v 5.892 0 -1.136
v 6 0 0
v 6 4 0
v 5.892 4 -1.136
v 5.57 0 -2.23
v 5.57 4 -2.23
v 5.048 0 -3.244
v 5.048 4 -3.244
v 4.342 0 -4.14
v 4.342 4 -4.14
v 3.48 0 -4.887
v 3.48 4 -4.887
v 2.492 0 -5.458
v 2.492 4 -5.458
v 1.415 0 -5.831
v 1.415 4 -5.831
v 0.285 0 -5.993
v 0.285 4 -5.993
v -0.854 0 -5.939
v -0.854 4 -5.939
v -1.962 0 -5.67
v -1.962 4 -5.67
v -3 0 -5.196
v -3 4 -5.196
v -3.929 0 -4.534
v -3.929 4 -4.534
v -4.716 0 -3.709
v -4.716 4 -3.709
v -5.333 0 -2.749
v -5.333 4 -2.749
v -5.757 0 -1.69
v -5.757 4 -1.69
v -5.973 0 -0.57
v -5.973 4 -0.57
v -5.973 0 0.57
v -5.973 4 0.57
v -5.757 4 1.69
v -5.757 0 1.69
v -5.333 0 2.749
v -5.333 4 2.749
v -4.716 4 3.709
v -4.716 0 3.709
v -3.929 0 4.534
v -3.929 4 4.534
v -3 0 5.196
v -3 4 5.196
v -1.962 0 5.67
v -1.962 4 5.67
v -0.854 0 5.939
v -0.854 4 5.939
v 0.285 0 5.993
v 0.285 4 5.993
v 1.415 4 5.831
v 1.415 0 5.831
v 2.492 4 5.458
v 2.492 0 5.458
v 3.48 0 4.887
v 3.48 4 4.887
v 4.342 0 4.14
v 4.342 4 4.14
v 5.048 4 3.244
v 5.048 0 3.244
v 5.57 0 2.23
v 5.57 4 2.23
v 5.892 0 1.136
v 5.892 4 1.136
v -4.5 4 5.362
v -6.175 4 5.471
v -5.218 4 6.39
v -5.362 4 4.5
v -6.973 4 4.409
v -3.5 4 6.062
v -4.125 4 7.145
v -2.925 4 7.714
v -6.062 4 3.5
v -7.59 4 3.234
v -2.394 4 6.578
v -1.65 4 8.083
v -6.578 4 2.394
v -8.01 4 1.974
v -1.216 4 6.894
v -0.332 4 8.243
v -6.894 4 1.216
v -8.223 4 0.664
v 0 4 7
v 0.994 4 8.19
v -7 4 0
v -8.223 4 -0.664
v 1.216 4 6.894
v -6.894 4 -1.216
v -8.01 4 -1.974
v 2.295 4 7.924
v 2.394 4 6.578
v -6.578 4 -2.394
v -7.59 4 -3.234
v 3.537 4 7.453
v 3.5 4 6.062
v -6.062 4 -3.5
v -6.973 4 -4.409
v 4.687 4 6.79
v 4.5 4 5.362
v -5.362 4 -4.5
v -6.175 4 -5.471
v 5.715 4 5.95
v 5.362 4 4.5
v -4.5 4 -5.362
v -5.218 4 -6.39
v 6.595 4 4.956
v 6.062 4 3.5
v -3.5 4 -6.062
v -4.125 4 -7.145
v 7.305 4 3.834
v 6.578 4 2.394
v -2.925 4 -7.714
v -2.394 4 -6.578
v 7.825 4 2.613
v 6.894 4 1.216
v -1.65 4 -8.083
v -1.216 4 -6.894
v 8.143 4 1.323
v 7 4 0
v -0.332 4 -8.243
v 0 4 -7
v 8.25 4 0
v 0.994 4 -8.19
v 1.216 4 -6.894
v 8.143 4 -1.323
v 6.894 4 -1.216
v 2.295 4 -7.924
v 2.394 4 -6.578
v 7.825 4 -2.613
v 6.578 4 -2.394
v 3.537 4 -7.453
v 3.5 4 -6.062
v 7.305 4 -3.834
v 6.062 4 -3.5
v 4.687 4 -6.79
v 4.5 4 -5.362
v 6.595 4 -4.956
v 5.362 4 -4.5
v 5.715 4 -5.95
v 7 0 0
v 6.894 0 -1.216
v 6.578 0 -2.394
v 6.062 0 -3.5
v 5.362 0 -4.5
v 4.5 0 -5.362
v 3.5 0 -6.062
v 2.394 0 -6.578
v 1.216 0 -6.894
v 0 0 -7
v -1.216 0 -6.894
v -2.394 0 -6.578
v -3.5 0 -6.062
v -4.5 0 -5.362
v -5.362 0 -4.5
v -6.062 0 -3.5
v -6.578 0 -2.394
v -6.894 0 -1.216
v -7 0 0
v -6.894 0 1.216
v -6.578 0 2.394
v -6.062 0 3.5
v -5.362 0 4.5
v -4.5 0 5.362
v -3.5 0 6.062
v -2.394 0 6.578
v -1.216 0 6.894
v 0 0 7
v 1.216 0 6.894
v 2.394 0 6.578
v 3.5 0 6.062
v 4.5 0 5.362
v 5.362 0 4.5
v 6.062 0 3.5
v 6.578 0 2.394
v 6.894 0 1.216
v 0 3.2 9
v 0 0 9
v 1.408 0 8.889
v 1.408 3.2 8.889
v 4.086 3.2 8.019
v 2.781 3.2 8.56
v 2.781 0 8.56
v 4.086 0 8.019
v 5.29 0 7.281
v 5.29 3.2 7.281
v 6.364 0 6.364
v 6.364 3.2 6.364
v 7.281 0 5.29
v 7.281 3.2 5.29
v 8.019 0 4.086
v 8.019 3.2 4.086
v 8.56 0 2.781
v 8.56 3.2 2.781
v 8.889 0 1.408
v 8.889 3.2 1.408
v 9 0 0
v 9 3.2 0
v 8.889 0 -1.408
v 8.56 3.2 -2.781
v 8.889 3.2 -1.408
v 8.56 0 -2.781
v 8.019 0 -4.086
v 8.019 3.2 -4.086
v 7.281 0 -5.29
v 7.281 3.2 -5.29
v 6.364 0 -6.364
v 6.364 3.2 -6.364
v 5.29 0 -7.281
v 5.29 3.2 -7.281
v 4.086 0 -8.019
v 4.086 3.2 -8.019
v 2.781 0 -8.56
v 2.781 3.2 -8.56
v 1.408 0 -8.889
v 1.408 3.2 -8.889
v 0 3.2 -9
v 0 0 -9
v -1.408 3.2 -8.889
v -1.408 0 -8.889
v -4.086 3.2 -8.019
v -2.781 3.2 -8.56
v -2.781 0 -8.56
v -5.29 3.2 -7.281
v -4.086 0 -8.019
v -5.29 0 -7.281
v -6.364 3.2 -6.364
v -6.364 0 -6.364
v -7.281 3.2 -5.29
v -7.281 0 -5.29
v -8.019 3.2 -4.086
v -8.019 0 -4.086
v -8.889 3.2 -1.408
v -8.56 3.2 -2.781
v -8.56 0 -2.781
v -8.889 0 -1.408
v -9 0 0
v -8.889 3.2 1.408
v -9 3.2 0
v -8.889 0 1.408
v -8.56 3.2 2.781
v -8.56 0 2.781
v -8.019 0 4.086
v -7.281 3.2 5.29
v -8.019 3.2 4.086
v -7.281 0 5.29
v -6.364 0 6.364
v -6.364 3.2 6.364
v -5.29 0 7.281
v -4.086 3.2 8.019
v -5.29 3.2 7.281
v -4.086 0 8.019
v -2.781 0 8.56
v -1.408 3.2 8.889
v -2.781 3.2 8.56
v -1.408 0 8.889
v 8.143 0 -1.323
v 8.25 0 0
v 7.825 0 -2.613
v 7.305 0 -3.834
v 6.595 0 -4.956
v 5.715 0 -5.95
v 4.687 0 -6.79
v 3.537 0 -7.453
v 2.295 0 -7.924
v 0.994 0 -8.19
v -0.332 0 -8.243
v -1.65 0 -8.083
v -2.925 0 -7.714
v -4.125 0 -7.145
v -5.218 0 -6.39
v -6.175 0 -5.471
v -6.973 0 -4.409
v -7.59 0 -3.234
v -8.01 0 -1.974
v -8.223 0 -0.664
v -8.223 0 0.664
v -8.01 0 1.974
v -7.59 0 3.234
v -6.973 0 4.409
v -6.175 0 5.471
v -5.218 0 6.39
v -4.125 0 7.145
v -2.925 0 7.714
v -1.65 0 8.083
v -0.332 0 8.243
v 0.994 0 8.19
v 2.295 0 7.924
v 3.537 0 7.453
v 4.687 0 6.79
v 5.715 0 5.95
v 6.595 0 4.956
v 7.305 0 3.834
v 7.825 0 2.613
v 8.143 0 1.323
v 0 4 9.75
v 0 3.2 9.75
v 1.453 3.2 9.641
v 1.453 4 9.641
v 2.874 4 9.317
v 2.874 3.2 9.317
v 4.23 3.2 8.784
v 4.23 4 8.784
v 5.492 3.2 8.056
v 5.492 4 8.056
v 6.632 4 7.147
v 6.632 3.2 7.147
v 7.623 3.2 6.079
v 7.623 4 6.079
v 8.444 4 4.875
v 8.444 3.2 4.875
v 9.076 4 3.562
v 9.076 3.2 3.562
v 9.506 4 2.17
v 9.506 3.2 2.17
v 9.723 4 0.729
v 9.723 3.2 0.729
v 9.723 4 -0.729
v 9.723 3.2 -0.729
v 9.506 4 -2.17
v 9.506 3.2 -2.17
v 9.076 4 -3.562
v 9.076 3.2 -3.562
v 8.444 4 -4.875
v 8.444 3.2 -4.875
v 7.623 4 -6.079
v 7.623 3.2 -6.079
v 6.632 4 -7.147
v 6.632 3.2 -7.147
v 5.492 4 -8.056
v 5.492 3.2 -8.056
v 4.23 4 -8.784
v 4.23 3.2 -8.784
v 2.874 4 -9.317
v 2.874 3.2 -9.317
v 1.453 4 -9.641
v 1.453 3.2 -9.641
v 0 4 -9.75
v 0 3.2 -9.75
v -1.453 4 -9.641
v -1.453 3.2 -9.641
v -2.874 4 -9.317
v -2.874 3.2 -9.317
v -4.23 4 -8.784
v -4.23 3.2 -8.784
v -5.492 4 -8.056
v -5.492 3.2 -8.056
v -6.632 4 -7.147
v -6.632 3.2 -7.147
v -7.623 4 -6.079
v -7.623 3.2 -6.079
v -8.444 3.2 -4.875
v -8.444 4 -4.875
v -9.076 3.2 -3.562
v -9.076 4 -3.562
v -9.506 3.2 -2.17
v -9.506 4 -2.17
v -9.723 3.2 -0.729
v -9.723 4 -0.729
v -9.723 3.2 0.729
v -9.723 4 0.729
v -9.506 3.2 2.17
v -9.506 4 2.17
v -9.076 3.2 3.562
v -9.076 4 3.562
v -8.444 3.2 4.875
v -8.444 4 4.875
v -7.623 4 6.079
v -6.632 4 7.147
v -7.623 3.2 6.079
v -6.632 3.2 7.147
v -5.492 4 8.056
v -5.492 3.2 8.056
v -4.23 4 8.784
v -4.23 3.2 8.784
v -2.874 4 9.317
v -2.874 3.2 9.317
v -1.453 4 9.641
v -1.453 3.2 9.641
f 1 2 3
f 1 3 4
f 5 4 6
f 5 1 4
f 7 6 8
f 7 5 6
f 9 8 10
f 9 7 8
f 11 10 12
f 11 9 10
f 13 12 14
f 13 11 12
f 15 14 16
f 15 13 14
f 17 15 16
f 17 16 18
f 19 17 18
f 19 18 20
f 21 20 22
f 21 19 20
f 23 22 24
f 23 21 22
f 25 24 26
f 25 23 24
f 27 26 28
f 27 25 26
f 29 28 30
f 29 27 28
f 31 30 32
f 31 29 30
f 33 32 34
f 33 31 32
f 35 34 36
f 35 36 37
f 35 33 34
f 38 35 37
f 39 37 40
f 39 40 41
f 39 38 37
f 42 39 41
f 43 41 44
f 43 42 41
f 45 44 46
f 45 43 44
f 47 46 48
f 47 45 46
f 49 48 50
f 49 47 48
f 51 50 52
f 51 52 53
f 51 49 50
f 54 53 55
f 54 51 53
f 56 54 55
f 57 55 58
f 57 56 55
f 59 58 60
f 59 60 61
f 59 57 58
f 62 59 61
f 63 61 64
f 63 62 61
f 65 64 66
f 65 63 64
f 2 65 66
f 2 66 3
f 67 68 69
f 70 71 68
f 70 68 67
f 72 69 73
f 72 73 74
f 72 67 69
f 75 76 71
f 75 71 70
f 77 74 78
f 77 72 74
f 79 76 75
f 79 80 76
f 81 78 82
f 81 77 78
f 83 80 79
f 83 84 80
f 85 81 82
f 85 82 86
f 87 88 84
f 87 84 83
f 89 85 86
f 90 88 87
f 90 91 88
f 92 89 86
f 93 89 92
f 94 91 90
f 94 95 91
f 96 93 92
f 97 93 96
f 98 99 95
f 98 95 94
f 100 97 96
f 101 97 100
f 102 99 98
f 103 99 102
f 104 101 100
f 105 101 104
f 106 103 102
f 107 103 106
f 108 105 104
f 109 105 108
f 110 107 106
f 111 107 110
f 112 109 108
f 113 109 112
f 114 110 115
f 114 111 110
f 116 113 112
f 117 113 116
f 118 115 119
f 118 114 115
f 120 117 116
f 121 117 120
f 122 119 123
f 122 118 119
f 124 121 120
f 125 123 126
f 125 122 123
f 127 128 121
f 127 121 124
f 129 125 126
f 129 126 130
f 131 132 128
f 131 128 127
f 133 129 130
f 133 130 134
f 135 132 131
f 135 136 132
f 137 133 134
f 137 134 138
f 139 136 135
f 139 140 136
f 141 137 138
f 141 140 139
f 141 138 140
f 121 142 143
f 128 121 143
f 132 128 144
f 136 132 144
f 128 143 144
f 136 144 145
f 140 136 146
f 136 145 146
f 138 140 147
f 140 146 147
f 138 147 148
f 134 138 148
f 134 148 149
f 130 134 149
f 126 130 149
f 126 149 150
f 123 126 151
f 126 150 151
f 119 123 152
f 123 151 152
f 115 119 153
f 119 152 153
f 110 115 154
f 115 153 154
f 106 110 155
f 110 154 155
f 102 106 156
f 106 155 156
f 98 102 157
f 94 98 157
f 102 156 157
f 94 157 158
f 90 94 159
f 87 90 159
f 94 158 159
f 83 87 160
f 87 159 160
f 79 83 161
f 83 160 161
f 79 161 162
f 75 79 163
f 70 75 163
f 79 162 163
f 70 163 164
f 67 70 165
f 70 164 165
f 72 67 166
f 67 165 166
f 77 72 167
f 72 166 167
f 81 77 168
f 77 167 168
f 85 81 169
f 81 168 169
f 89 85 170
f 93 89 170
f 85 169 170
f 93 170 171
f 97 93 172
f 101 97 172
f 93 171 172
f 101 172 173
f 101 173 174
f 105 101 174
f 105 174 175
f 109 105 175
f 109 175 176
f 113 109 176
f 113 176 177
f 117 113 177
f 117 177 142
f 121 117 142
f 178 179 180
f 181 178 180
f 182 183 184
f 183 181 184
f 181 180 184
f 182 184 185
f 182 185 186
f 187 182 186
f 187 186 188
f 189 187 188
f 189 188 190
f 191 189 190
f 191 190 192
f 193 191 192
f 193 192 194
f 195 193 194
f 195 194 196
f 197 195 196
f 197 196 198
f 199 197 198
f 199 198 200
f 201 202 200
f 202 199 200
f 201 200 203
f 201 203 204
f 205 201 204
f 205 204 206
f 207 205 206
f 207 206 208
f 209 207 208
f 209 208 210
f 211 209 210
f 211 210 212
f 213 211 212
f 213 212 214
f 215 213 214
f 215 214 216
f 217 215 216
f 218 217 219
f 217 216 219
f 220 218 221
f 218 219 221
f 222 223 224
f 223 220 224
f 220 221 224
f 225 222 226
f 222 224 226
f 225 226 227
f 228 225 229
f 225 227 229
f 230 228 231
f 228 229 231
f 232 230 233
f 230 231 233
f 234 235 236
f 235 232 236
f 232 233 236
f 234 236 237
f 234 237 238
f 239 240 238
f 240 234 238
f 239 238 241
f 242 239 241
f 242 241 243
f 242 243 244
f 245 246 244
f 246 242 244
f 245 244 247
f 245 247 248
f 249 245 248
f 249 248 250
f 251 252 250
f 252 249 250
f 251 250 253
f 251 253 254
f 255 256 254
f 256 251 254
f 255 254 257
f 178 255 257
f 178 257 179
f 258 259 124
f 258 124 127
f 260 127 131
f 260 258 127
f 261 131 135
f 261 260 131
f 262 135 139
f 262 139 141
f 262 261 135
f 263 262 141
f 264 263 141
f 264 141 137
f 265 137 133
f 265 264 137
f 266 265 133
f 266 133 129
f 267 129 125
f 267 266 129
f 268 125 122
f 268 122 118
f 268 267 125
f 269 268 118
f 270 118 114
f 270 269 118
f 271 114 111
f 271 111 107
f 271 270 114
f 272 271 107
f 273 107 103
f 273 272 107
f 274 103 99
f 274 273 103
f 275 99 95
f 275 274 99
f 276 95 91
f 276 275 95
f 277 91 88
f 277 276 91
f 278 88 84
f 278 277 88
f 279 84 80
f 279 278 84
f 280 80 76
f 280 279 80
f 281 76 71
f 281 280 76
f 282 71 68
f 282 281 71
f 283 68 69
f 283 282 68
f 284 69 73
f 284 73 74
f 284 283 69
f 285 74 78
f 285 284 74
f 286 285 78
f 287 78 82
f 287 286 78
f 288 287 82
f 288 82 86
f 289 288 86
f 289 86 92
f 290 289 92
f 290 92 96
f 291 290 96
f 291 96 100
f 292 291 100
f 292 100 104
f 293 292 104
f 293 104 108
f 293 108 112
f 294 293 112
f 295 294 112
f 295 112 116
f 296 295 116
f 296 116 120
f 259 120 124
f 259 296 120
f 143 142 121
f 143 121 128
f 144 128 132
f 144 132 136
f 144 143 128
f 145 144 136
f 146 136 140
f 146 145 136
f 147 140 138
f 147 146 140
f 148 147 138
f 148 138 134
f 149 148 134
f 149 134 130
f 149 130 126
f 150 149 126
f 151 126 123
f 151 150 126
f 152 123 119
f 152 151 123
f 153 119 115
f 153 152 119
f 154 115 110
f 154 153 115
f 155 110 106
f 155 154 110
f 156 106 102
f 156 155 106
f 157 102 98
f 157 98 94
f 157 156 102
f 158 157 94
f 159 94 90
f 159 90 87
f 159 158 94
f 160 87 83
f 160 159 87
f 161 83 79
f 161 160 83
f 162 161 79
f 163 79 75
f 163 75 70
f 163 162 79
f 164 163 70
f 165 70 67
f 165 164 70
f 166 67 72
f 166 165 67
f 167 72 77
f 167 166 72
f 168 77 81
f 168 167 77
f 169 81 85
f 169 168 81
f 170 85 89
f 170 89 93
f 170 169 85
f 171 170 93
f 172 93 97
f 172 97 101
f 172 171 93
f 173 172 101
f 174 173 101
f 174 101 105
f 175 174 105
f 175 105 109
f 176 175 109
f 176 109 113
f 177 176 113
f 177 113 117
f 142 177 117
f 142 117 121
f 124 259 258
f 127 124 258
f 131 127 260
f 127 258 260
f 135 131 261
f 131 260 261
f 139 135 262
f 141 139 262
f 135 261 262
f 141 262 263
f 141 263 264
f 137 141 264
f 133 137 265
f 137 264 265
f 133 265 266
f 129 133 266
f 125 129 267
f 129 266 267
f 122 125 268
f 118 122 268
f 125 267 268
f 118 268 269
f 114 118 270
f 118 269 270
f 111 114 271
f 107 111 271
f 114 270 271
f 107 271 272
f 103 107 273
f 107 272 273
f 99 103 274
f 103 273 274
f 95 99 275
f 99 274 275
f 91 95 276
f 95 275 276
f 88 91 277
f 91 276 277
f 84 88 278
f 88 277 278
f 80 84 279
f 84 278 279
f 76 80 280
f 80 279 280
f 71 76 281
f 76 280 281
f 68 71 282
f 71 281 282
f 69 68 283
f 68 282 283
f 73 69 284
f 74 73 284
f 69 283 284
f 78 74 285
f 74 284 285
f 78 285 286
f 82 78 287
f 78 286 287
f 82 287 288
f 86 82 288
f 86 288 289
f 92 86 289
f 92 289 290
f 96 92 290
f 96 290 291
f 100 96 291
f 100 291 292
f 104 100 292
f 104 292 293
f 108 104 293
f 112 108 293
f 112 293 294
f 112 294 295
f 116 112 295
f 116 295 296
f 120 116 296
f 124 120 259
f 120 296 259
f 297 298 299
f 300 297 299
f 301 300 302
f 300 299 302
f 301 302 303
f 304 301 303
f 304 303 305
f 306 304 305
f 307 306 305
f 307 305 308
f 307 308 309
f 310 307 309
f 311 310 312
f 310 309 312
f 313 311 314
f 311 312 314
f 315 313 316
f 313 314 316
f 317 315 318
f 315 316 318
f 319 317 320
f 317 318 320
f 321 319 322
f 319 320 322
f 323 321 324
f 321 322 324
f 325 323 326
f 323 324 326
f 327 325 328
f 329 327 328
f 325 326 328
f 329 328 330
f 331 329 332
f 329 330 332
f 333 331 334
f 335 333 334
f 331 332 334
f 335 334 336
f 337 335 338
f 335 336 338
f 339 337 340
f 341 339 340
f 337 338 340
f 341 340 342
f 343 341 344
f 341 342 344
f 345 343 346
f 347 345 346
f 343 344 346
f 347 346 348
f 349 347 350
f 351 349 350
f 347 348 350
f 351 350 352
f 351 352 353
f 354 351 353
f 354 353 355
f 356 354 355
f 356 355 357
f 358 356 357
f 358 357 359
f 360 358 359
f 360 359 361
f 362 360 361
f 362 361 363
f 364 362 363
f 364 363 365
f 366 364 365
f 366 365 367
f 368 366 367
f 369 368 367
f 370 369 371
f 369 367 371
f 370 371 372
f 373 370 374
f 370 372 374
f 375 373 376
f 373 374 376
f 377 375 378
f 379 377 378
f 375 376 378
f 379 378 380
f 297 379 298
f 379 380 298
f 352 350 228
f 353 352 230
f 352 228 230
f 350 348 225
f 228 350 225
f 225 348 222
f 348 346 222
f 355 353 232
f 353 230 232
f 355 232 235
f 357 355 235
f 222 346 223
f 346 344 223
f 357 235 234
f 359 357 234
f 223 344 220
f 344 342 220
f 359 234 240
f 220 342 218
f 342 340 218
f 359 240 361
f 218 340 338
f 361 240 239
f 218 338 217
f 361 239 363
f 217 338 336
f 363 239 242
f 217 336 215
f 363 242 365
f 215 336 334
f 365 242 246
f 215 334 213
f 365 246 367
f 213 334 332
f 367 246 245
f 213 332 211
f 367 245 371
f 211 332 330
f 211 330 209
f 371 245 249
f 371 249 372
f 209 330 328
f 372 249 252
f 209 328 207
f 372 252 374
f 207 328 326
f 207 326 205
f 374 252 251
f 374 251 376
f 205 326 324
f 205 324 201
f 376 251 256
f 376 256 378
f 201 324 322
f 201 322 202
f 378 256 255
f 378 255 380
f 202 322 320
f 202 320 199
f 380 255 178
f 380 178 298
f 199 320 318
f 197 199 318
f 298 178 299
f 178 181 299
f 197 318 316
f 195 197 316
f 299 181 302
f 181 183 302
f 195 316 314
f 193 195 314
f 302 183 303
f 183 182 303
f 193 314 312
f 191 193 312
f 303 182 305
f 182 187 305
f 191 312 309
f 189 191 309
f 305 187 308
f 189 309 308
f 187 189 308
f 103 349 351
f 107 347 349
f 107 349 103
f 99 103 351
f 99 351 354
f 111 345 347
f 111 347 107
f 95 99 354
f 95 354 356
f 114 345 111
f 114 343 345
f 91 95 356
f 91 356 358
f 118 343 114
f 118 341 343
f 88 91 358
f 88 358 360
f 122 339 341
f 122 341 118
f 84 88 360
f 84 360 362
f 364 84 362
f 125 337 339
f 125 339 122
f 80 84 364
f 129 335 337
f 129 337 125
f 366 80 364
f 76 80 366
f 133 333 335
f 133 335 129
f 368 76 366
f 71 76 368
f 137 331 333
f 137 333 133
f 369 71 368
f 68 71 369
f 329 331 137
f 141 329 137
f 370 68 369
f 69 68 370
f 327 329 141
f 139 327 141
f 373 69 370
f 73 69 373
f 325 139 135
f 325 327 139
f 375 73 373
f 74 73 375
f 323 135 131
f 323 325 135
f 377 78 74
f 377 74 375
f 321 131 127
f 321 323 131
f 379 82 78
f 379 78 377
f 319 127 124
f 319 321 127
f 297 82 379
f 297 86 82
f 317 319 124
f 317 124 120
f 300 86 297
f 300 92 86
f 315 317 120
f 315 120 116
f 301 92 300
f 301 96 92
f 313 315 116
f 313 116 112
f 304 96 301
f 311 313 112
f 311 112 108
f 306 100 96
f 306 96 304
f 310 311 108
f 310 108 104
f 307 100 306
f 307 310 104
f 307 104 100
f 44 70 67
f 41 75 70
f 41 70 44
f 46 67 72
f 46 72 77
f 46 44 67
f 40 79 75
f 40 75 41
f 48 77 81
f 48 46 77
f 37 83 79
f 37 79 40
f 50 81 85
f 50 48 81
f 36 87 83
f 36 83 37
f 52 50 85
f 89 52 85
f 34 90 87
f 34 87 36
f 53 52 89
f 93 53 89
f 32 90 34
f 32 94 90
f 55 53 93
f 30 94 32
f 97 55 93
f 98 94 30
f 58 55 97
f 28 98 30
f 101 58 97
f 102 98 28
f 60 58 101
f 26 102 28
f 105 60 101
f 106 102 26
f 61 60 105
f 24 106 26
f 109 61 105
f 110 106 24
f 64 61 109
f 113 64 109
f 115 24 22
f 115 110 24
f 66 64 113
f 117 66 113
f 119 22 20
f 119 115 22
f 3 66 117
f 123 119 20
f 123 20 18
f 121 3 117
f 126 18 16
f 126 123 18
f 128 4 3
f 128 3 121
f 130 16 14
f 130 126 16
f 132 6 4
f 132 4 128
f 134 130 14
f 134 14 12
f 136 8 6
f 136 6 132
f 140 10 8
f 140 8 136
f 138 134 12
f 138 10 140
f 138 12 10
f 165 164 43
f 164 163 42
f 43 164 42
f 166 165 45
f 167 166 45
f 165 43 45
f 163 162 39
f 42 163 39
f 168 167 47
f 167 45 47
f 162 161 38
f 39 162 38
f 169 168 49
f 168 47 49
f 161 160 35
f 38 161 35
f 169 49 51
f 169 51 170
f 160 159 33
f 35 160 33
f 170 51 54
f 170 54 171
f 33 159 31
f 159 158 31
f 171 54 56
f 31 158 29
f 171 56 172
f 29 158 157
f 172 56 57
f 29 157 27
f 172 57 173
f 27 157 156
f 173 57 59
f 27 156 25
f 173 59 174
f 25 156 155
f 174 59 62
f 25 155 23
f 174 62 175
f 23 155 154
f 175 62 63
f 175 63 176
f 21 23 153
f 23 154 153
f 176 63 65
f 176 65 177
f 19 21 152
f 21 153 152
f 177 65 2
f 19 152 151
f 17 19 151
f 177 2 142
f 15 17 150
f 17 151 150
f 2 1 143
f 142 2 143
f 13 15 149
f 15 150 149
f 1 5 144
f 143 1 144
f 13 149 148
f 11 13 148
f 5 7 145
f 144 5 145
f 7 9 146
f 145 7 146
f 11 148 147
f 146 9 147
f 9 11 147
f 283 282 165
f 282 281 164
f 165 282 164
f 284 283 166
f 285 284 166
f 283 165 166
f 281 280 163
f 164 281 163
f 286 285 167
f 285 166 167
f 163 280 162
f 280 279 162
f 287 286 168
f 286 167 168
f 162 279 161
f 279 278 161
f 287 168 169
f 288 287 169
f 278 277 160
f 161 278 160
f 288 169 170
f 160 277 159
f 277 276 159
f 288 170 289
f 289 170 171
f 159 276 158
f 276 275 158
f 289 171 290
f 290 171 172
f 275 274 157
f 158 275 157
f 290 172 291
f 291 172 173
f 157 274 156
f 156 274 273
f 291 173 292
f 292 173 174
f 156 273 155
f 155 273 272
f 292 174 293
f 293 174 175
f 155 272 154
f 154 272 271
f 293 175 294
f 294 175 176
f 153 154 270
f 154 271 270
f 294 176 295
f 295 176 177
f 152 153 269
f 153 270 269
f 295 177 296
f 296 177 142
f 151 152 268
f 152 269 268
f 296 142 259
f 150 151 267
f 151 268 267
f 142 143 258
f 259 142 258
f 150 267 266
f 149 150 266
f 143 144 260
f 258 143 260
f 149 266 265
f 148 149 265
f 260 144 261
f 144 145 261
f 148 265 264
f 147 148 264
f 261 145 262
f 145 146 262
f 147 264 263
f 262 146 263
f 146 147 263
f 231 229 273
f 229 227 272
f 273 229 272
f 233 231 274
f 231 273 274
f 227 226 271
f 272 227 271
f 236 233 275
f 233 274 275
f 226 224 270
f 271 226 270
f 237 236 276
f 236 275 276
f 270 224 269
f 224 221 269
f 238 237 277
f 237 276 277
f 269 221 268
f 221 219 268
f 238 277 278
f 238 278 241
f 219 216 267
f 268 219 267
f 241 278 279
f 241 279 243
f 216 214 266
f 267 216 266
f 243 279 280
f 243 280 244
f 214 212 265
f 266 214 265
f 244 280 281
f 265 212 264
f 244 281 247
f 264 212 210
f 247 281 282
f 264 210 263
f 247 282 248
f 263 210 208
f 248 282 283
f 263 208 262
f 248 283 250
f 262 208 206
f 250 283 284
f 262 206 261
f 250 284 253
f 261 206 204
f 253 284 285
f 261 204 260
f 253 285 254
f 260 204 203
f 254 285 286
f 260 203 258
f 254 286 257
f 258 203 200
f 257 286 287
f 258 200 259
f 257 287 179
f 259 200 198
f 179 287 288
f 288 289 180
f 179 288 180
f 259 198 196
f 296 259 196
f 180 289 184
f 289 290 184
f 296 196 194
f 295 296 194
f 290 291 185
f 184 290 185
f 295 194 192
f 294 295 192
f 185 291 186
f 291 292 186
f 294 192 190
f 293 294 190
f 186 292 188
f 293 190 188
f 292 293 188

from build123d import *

# Parameters (mm, degrees)
SKETCH_1_R                   = 9
SKETCH_1_R_2                 = 6
EXTRUDE_1_DEPTH              = 4
EXTRUDE_START                = -0.8
SKETCH_2_R                   = 9.75
SKETCH_2_R_2                 = 6
EXTRUDE_2_DEPTH              = 0.8
SPLIT_BODIES_1_OUTLINE_R     = 8.25
SPLIT_BODIES_1_OUTLINE_R_2   = 7
SPLIT_BODIES_1_DEPTH         = 4
SPLIT_BODIES_1_2_OUTLINE_R   = 7
SPLIT_BODIES_1_2_OUTLINE_R_2 = 6
SPLIT_BODIES_1_2_DEPTH       = 4
SPLIT_BODIES_1_3_OUTLINE_R   = 8.25
SPLIT_BODIES_1_3_OUTLINE_R_2 = 6
SPLIT_BODIES_1_3_DEPTH       = 4


# Read off the part's stored shape, not the designer's step: 分割1
with BuildPart() as part:
    # 草图1 → 凸台-拉伸1 (new body)
    with BuildSketch(Plane(origin=(0, 0, 0), x_dir=(1, 0, 0), z_dir=(0, 1, 0))):
        with Locations(Location((0, 0, 0), (0, 0, 270))):
            Circle(SKETCH_1_R)
        with Locations(Location((0, 0, 0), (0, 0, 270))):
            Circle(SKETCH_1_R_2, mode=Mode.SUBTRACT)
    extrude(amount=EXTRUDE_1_DEPTH)

    # 草图2 → 凸台-拉伸2 (add)
    with BuildSketch(Plane(origin=(0, 4, 0), x_dir=(1, 0, 0), z_dir=(0, 1, 0)).offset(EXTRUDE_START)):
        with Locations(Location((0, 0, 0), (0, 0, 270))):
            Circle(SKETCH_2_R)
        with Locations(Location((0, 0, 0), (0, 0, 270))):
            Circle(SKETCH_2_R_2, mode=Mode.SUBTRACT)
    extrude(amount=EXTRUDE_2_DEPTH)

    # Split Bodies 1 3 outline → Split Bodies 1 3 (cut)
    with BuildSketch(Plane(origin=(0, 0, 0), x_dir=(1, 0, 0), z_dir=(0, 1, 0))):
        Circle(SPLIT_BODIES_1_3_OUTLINE_R)
        Circle(SPLIT_BODIES_1_3_OUTLINE_R_2, mode=Mode.SUBTRACT)
    extrude(amount=SPLIT_BODIES_1_3_DEPTH, mode=Mode.SUBTRACT)


with BuildPart() as body_2:
    # Split Bodies 1 outline → Split Bodies 1 (new body)
    with BuildSketch(Plane(origin=(0, 0, 0), x_dir=(1, 0, 0), z_dir=(0, 1, 0))):
        Circle(SPLIT_BODIES_1_OUTLINE_R)
        Circle(SPLIT_BODIES_1_OUTLINE_R_2, mode=Mode.SUBTRACT)
    extrude(amount=SPLIT_BODIES_1_DEPTH)


with BuildPart() as body_3:
    # Split Bodies 1 2 outline → Split Bodies 1 2 (new body)
    with BuildSketch(Plane(origin=(0, 0, 0), x_dir=(1, 0, 0), z_dir=(0, 1, 0))):
        Circle(SPLIT_BODIES_1_2_OUTLINE_R)
        Circle(SPLIT_BODIES_1_2_OUTLINE_R_2, mode=Mode.SUBTRACT)
    extrude(amount=SPLIT_BODIES_1_2_DEPTH)


solid = Compound([part.part, body_2.part, body_3.part])
